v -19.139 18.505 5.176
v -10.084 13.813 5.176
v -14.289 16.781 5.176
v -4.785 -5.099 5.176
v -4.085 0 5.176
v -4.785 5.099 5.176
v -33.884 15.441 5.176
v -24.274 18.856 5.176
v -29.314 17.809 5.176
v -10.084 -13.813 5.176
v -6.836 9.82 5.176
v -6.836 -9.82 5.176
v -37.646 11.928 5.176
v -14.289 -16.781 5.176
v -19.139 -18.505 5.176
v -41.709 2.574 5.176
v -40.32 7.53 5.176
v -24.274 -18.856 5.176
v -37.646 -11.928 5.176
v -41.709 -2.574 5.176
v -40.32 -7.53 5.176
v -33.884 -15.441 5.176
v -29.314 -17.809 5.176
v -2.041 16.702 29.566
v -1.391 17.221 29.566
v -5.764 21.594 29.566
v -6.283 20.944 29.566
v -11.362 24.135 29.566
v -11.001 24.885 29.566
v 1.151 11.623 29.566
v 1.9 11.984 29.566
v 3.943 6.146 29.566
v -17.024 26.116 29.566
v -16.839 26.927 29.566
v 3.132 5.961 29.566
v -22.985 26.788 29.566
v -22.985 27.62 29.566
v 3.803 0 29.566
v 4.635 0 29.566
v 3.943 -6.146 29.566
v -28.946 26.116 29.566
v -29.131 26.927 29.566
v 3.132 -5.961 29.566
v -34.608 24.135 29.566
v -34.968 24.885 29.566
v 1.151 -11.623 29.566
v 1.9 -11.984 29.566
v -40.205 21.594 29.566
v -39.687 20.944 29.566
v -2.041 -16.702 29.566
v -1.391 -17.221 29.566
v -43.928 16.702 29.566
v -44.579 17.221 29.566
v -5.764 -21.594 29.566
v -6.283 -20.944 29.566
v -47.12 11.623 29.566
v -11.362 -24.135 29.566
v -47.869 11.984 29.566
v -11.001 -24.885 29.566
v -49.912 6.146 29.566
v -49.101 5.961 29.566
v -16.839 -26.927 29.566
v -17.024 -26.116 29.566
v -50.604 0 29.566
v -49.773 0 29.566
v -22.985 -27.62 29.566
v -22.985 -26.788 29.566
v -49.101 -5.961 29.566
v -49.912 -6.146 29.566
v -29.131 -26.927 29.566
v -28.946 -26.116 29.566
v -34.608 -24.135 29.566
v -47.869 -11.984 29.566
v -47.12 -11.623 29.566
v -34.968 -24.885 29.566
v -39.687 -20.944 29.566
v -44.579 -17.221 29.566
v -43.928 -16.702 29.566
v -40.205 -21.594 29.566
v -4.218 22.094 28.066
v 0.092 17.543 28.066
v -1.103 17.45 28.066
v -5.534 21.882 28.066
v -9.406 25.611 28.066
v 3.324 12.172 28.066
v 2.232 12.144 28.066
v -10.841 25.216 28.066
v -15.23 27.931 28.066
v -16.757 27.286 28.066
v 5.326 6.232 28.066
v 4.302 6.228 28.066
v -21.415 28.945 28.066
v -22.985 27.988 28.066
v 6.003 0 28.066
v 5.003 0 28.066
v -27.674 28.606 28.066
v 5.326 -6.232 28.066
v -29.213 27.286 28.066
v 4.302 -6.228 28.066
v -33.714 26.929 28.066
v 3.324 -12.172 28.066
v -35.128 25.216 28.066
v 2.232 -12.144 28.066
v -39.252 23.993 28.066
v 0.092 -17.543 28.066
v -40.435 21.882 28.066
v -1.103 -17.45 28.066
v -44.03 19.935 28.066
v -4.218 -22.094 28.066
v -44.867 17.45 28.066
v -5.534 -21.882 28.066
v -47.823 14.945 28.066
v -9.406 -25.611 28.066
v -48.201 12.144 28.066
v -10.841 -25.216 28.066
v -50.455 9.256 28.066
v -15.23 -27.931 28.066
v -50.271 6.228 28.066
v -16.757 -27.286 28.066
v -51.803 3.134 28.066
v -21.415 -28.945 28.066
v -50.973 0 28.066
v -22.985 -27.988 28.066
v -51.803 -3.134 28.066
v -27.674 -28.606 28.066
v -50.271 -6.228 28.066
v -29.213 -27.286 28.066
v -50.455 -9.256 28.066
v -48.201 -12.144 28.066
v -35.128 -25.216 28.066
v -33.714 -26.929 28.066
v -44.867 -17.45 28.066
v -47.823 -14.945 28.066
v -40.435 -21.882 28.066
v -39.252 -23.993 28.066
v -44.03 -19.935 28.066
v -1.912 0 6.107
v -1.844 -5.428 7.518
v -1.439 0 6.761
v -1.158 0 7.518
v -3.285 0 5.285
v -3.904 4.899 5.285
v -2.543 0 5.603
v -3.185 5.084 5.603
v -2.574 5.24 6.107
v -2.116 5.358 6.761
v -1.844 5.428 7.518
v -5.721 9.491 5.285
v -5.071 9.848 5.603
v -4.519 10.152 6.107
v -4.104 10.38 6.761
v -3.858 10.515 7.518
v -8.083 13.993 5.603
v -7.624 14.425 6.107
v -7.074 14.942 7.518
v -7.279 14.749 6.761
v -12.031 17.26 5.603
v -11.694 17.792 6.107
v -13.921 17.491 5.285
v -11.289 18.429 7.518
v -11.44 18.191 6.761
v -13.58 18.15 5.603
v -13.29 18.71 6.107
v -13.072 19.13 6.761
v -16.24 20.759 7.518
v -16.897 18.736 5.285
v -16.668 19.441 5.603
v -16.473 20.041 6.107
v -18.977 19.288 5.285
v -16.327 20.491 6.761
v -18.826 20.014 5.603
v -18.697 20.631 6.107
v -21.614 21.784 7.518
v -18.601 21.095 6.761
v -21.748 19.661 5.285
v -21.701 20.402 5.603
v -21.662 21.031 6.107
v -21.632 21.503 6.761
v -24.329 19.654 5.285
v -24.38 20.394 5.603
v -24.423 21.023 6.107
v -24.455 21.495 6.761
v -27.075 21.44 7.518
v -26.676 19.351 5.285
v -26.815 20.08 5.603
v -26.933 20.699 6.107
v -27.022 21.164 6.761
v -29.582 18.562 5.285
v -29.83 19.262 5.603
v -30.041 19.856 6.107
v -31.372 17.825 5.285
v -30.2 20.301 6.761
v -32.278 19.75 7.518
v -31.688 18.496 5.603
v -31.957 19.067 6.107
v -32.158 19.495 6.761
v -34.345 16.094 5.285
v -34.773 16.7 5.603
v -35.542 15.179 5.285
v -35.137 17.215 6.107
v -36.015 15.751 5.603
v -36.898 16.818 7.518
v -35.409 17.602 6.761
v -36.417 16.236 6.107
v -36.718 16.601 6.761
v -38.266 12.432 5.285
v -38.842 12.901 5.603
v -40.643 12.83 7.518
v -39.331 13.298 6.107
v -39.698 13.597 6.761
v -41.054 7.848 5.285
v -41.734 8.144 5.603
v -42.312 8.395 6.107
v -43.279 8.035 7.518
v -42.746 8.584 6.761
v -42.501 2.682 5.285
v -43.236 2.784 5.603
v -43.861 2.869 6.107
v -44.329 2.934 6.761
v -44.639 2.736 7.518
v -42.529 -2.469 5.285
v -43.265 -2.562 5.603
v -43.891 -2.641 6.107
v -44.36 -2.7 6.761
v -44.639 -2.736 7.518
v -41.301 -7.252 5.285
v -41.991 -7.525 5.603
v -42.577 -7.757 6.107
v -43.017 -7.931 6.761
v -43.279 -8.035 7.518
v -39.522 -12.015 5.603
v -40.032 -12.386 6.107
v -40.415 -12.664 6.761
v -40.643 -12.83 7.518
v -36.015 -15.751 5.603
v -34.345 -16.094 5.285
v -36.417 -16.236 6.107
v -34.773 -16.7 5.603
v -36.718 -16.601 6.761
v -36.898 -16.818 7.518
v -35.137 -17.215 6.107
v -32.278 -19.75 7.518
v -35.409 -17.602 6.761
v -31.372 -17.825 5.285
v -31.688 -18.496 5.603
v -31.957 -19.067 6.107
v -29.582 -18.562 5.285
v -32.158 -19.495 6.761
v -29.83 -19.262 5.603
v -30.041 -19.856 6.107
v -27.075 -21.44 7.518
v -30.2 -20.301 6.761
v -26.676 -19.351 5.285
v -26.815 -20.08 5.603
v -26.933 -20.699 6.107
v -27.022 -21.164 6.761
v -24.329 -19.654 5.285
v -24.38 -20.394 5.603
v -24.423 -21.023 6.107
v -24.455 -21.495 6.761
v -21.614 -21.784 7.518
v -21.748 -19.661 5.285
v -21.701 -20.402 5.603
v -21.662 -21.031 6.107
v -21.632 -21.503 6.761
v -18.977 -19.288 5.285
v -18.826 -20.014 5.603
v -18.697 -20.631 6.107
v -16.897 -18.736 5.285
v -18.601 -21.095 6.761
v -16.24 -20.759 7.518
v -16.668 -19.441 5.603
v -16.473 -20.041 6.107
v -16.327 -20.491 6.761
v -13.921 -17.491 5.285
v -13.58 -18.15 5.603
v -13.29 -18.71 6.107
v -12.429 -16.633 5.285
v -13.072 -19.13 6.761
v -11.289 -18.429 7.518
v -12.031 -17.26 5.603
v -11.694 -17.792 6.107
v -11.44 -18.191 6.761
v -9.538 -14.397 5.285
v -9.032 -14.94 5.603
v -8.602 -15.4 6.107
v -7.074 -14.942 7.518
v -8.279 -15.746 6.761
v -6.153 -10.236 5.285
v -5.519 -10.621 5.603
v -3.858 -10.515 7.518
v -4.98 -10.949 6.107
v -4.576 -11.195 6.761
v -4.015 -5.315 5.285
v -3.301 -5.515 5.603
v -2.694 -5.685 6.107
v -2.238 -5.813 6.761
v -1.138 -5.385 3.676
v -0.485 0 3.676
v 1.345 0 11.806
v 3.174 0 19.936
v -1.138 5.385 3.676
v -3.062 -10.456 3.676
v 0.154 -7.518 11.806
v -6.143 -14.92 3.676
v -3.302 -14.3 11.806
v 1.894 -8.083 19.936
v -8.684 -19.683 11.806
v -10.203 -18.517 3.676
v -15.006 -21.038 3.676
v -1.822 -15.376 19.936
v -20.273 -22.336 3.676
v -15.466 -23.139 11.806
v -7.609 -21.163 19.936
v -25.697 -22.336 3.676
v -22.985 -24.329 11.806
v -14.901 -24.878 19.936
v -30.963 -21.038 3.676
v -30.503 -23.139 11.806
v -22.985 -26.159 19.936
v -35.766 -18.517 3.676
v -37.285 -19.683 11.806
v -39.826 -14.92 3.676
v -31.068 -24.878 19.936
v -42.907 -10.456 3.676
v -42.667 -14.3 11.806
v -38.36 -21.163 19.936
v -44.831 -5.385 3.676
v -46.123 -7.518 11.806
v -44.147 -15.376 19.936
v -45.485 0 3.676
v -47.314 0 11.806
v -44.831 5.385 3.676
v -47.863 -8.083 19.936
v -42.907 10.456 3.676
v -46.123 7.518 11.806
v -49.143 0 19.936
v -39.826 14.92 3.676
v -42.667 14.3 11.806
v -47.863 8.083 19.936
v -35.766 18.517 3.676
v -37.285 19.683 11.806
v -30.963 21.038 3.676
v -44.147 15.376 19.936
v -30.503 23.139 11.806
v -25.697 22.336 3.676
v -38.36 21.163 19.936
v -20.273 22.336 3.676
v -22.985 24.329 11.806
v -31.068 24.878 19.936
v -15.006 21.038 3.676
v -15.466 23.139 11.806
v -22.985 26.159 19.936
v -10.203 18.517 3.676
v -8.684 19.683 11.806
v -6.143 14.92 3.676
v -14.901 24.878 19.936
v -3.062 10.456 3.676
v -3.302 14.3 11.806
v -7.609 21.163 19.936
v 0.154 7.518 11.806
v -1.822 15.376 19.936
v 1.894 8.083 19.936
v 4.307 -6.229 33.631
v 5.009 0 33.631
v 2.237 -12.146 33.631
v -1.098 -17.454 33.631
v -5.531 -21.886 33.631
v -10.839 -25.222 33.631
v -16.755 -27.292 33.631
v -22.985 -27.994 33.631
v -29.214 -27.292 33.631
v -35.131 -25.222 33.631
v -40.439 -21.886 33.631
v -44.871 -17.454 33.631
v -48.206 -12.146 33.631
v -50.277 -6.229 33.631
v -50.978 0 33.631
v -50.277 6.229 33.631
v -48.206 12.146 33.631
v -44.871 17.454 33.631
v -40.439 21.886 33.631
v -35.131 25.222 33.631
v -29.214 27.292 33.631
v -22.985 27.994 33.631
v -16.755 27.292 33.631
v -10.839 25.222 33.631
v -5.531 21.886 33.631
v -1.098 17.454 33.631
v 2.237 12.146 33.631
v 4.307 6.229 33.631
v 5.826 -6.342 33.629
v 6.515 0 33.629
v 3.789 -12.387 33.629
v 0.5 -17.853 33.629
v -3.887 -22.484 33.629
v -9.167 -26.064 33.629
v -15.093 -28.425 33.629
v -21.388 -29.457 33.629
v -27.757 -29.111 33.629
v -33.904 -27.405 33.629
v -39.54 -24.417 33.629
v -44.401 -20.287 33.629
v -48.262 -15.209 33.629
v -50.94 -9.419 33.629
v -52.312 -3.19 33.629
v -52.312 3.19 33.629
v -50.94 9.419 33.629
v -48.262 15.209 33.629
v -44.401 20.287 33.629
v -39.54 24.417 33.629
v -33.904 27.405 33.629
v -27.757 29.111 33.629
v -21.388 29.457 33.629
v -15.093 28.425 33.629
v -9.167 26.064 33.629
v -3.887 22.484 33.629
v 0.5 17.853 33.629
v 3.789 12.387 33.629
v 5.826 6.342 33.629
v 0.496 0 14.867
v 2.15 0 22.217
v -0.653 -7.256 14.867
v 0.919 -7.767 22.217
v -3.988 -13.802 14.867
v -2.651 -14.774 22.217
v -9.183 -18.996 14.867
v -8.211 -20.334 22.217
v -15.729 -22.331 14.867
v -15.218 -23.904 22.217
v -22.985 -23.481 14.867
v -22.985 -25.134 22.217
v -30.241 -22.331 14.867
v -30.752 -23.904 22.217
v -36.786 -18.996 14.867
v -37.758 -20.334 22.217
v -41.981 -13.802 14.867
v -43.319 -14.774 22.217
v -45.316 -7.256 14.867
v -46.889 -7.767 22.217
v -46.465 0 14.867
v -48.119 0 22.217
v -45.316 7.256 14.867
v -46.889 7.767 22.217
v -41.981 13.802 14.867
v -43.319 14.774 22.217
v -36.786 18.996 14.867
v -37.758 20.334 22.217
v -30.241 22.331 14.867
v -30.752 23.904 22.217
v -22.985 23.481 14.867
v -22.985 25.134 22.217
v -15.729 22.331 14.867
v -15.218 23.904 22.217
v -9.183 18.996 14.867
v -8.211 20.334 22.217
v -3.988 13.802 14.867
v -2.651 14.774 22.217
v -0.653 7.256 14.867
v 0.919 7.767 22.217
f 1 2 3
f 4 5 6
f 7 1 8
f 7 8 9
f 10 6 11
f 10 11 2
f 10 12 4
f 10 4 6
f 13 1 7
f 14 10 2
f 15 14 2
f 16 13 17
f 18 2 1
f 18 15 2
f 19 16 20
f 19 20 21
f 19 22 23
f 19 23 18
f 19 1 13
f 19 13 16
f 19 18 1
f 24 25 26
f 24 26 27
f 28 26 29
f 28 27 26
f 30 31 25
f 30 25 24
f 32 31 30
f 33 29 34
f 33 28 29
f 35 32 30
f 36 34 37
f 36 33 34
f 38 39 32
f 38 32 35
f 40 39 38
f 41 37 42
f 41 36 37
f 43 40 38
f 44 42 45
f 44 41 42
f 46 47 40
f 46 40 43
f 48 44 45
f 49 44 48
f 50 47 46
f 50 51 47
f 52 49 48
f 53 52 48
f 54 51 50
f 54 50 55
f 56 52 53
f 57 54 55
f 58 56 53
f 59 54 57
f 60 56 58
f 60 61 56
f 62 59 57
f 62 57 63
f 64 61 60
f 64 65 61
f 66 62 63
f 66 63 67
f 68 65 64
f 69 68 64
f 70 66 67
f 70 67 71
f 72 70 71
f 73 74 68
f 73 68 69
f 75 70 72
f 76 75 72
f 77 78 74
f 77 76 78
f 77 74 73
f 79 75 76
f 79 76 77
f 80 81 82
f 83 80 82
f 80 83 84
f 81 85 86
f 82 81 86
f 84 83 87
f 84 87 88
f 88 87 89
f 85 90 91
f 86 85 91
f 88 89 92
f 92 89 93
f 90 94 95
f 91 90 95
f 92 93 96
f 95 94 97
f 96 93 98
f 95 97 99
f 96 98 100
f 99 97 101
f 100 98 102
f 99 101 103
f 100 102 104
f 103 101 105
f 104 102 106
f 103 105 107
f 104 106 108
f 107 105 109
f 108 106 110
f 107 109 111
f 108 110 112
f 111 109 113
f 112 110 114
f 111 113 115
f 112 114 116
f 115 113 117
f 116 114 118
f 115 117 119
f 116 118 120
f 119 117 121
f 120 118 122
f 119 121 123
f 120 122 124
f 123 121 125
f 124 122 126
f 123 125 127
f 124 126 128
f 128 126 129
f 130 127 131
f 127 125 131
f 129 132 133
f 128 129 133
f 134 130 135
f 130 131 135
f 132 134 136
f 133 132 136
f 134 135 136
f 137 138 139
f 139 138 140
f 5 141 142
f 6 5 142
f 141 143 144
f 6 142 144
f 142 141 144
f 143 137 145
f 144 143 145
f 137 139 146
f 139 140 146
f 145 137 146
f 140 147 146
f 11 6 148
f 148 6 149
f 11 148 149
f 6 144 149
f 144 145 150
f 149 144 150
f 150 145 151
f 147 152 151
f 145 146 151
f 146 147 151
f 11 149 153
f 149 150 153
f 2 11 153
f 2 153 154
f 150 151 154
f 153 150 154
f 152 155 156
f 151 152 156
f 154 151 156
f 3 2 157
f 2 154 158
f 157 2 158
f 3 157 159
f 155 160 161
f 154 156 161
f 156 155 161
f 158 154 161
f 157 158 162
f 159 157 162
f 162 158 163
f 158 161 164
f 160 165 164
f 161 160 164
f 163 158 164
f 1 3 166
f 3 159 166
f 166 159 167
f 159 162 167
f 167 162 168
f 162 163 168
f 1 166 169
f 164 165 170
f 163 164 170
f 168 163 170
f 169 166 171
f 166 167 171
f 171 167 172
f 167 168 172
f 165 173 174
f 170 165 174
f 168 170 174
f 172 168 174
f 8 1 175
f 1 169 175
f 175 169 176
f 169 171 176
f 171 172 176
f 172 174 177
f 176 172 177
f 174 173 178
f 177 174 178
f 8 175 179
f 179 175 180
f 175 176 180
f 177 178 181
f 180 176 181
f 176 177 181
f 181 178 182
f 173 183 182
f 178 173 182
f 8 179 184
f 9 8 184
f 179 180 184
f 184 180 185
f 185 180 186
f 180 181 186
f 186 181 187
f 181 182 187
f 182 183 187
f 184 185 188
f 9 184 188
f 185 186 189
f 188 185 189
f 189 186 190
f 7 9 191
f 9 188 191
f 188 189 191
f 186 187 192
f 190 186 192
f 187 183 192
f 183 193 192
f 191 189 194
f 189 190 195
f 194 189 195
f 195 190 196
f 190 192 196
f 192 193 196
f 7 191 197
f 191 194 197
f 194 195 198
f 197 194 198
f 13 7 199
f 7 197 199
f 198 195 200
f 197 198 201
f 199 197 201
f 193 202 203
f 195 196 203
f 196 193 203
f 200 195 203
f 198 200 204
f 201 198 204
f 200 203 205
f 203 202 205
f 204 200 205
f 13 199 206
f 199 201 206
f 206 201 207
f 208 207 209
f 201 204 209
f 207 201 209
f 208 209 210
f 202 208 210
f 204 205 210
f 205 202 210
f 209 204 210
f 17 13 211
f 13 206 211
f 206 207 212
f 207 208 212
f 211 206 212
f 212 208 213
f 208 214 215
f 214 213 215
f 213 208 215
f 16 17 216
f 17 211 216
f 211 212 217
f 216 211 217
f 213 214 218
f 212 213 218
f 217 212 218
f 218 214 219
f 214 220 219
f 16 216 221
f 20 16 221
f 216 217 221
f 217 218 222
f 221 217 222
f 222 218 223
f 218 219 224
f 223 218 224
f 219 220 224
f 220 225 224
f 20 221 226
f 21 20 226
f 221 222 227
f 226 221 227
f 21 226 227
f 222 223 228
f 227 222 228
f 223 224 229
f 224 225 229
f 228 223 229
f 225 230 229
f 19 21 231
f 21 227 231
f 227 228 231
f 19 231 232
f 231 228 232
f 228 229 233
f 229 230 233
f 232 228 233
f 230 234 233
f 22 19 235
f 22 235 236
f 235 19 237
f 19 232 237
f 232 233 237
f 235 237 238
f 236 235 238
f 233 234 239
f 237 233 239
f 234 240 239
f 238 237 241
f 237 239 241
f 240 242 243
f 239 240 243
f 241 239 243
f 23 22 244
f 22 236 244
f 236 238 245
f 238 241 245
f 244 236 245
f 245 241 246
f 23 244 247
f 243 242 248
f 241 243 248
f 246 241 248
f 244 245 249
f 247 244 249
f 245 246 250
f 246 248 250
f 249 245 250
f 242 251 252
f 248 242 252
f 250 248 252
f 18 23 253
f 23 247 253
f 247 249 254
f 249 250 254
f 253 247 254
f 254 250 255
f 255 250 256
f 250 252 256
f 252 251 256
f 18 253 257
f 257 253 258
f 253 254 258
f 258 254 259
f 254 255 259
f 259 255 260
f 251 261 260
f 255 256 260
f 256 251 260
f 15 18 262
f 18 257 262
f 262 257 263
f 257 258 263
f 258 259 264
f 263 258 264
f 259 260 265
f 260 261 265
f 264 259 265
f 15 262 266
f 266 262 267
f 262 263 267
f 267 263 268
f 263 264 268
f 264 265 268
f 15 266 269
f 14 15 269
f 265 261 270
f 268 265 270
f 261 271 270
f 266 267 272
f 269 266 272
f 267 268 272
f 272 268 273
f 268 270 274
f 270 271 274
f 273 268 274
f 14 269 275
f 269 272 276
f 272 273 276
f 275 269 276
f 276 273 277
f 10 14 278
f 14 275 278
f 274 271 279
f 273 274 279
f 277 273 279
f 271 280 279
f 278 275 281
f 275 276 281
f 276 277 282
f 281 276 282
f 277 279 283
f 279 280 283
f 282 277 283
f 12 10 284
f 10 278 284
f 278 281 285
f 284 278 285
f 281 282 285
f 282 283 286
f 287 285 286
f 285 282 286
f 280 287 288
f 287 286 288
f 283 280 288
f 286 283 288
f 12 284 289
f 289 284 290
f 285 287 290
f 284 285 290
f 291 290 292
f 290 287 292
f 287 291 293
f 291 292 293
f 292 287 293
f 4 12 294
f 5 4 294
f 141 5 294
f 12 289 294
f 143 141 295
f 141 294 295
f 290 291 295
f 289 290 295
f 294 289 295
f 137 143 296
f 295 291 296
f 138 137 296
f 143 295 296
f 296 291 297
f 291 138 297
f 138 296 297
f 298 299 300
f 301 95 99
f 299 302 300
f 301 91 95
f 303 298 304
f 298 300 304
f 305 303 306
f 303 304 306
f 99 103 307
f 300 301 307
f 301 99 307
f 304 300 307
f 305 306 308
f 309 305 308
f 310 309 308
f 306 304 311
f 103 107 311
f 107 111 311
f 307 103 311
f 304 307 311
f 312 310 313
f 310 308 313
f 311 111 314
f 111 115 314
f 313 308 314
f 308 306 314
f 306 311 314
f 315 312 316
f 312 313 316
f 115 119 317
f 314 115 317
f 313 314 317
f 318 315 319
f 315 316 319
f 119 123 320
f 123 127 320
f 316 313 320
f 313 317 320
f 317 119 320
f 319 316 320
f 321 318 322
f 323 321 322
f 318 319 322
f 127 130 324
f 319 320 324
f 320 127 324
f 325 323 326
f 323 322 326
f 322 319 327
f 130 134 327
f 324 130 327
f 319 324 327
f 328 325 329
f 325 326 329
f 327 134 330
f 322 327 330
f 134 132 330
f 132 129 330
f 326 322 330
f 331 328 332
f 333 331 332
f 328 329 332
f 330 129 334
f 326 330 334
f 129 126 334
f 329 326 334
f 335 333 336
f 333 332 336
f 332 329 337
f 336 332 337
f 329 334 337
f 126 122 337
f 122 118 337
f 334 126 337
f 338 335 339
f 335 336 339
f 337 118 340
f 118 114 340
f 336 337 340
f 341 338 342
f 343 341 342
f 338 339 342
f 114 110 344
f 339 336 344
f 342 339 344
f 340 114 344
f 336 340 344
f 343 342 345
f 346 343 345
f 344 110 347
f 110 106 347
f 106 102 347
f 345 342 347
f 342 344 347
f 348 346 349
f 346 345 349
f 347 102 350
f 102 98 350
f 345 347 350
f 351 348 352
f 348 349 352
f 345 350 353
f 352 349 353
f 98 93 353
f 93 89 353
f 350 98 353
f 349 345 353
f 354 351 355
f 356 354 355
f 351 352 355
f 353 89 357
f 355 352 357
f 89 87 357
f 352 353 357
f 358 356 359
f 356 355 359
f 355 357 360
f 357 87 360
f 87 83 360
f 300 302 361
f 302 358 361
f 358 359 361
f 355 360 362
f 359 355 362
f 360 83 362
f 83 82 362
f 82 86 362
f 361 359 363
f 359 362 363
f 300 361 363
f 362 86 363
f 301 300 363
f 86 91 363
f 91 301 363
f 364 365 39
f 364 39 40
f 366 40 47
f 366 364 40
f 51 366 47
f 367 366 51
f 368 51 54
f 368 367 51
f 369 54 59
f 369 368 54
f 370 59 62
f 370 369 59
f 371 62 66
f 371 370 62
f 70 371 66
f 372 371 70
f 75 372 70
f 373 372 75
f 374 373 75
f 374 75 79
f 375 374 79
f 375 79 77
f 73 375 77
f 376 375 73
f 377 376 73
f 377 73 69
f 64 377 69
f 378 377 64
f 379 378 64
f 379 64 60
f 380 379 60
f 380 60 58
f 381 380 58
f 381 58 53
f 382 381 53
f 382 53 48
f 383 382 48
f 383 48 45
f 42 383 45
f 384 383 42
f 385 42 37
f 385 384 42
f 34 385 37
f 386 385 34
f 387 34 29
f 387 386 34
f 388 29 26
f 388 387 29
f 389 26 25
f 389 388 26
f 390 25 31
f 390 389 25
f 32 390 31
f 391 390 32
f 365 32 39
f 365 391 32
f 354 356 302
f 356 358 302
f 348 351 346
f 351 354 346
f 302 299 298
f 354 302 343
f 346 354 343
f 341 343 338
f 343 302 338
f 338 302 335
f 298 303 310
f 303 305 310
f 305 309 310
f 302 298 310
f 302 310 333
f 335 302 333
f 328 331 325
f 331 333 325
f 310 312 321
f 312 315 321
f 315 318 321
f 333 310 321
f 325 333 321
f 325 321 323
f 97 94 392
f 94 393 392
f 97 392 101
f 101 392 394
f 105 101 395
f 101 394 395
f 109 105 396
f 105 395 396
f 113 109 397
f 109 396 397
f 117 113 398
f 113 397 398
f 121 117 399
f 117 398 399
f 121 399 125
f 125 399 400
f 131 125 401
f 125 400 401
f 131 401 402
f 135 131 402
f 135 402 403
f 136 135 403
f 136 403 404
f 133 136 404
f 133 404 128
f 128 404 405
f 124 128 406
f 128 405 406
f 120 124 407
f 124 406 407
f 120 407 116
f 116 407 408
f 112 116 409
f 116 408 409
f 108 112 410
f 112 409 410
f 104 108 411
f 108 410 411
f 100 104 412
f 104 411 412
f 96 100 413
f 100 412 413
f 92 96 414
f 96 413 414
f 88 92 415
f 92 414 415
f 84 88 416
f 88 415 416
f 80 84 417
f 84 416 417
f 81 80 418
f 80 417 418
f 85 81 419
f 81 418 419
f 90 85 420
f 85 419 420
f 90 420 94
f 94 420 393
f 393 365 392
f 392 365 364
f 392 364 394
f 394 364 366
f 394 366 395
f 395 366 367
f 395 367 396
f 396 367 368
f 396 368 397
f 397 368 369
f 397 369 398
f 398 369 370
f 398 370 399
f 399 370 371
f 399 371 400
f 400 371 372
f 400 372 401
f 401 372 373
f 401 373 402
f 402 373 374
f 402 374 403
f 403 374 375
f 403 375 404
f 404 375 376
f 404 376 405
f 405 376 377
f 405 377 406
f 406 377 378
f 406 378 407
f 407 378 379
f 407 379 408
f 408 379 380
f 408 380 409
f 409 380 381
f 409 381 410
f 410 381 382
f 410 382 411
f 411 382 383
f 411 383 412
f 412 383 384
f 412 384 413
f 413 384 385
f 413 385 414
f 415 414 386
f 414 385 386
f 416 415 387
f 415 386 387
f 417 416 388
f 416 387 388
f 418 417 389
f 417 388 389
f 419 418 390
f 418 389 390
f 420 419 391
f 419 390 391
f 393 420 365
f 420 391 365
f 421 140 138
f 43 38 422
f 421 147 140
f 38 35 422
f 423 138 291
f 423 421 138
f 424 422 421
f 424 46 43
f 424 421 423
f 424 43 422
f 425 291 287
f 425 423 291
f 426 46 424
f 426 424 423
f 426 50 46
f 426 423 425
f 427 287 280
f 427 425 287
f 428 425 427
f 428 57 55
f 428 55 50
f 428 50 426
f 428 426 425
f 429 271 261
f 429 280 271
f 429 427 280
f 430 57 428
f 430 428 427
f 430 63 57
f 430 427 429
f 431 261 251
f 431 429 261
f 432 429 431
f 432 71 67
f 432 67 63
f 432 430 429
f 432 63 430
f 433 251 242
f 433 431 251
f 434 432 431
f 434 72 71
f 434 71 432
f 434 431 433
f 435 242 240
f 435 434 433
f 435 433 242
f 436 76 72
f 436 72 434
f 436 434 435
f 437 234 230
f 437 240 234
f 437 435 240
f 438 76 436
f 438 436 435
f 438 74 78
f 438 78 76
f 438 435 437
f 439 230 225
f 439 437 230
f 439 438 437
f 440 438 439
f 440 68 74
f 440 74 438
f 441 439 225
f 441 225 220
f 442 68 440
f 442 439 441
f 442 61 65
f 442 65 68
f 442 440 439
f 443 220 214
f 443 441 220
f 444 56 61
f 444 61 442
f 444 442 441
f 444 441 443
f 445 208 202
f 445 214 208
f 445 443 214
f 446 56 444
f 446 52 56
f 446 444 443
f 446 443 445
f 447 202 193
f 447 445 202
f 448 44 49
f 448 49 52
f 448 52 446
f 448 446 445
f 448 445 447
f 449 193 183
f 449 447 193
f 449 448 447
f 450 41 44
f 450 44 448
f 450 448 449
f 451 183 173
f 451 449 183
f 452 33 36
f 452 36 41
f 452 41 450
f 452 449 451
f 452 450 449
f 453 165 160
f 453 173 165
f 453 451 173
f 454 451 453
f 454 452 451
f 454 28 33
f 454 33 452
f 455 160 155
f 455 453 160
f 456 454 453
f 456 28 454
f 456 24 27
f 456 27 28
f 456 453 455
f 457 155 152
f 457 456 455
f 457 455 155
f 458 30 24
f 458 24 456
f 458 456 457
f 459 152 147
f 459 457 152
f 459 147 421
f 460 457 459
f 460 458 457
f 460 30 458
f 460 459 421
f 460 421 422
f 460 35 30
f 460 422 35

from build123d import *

# Parameters (mm, degrees)
F2_T = -1.5
F3_R = 3


with BuildPart() as f1:
    # F0 (on Front) → F1 (revolve)
    with BuildSketch(Plane.XZ):
        Polygon((-22.9846419008, 33.67621309), (-22.9846419008, 3.67621309), (-0.4846419008, 3.67621309), (5.0033481255, 28.0664153333), (6.0033481255, 28.0664153333), (6.5153195148, 33.6285006523), align=None)
    revolve(axis=Axis((-22.9846419008, 0, 18.67621309), (0, 0, -1)))

    # F2
    f2_openings = [f1.faces().sort_by_distance(p)[0] for p in [
        (-37.734623, 0, 33.652357),
    ]]
    offset(amount=F2_T, openings=f2_openings, kind=Kind.INTERSECTION)

    # F3
    f3_edges = [f1.edges().sort_by_distance(p)[0] for p in [
        (-44.284651, 0, 5.176213),
    ]]
    fillet(f3_edges, radius=F3_R)


solid = f1.part
